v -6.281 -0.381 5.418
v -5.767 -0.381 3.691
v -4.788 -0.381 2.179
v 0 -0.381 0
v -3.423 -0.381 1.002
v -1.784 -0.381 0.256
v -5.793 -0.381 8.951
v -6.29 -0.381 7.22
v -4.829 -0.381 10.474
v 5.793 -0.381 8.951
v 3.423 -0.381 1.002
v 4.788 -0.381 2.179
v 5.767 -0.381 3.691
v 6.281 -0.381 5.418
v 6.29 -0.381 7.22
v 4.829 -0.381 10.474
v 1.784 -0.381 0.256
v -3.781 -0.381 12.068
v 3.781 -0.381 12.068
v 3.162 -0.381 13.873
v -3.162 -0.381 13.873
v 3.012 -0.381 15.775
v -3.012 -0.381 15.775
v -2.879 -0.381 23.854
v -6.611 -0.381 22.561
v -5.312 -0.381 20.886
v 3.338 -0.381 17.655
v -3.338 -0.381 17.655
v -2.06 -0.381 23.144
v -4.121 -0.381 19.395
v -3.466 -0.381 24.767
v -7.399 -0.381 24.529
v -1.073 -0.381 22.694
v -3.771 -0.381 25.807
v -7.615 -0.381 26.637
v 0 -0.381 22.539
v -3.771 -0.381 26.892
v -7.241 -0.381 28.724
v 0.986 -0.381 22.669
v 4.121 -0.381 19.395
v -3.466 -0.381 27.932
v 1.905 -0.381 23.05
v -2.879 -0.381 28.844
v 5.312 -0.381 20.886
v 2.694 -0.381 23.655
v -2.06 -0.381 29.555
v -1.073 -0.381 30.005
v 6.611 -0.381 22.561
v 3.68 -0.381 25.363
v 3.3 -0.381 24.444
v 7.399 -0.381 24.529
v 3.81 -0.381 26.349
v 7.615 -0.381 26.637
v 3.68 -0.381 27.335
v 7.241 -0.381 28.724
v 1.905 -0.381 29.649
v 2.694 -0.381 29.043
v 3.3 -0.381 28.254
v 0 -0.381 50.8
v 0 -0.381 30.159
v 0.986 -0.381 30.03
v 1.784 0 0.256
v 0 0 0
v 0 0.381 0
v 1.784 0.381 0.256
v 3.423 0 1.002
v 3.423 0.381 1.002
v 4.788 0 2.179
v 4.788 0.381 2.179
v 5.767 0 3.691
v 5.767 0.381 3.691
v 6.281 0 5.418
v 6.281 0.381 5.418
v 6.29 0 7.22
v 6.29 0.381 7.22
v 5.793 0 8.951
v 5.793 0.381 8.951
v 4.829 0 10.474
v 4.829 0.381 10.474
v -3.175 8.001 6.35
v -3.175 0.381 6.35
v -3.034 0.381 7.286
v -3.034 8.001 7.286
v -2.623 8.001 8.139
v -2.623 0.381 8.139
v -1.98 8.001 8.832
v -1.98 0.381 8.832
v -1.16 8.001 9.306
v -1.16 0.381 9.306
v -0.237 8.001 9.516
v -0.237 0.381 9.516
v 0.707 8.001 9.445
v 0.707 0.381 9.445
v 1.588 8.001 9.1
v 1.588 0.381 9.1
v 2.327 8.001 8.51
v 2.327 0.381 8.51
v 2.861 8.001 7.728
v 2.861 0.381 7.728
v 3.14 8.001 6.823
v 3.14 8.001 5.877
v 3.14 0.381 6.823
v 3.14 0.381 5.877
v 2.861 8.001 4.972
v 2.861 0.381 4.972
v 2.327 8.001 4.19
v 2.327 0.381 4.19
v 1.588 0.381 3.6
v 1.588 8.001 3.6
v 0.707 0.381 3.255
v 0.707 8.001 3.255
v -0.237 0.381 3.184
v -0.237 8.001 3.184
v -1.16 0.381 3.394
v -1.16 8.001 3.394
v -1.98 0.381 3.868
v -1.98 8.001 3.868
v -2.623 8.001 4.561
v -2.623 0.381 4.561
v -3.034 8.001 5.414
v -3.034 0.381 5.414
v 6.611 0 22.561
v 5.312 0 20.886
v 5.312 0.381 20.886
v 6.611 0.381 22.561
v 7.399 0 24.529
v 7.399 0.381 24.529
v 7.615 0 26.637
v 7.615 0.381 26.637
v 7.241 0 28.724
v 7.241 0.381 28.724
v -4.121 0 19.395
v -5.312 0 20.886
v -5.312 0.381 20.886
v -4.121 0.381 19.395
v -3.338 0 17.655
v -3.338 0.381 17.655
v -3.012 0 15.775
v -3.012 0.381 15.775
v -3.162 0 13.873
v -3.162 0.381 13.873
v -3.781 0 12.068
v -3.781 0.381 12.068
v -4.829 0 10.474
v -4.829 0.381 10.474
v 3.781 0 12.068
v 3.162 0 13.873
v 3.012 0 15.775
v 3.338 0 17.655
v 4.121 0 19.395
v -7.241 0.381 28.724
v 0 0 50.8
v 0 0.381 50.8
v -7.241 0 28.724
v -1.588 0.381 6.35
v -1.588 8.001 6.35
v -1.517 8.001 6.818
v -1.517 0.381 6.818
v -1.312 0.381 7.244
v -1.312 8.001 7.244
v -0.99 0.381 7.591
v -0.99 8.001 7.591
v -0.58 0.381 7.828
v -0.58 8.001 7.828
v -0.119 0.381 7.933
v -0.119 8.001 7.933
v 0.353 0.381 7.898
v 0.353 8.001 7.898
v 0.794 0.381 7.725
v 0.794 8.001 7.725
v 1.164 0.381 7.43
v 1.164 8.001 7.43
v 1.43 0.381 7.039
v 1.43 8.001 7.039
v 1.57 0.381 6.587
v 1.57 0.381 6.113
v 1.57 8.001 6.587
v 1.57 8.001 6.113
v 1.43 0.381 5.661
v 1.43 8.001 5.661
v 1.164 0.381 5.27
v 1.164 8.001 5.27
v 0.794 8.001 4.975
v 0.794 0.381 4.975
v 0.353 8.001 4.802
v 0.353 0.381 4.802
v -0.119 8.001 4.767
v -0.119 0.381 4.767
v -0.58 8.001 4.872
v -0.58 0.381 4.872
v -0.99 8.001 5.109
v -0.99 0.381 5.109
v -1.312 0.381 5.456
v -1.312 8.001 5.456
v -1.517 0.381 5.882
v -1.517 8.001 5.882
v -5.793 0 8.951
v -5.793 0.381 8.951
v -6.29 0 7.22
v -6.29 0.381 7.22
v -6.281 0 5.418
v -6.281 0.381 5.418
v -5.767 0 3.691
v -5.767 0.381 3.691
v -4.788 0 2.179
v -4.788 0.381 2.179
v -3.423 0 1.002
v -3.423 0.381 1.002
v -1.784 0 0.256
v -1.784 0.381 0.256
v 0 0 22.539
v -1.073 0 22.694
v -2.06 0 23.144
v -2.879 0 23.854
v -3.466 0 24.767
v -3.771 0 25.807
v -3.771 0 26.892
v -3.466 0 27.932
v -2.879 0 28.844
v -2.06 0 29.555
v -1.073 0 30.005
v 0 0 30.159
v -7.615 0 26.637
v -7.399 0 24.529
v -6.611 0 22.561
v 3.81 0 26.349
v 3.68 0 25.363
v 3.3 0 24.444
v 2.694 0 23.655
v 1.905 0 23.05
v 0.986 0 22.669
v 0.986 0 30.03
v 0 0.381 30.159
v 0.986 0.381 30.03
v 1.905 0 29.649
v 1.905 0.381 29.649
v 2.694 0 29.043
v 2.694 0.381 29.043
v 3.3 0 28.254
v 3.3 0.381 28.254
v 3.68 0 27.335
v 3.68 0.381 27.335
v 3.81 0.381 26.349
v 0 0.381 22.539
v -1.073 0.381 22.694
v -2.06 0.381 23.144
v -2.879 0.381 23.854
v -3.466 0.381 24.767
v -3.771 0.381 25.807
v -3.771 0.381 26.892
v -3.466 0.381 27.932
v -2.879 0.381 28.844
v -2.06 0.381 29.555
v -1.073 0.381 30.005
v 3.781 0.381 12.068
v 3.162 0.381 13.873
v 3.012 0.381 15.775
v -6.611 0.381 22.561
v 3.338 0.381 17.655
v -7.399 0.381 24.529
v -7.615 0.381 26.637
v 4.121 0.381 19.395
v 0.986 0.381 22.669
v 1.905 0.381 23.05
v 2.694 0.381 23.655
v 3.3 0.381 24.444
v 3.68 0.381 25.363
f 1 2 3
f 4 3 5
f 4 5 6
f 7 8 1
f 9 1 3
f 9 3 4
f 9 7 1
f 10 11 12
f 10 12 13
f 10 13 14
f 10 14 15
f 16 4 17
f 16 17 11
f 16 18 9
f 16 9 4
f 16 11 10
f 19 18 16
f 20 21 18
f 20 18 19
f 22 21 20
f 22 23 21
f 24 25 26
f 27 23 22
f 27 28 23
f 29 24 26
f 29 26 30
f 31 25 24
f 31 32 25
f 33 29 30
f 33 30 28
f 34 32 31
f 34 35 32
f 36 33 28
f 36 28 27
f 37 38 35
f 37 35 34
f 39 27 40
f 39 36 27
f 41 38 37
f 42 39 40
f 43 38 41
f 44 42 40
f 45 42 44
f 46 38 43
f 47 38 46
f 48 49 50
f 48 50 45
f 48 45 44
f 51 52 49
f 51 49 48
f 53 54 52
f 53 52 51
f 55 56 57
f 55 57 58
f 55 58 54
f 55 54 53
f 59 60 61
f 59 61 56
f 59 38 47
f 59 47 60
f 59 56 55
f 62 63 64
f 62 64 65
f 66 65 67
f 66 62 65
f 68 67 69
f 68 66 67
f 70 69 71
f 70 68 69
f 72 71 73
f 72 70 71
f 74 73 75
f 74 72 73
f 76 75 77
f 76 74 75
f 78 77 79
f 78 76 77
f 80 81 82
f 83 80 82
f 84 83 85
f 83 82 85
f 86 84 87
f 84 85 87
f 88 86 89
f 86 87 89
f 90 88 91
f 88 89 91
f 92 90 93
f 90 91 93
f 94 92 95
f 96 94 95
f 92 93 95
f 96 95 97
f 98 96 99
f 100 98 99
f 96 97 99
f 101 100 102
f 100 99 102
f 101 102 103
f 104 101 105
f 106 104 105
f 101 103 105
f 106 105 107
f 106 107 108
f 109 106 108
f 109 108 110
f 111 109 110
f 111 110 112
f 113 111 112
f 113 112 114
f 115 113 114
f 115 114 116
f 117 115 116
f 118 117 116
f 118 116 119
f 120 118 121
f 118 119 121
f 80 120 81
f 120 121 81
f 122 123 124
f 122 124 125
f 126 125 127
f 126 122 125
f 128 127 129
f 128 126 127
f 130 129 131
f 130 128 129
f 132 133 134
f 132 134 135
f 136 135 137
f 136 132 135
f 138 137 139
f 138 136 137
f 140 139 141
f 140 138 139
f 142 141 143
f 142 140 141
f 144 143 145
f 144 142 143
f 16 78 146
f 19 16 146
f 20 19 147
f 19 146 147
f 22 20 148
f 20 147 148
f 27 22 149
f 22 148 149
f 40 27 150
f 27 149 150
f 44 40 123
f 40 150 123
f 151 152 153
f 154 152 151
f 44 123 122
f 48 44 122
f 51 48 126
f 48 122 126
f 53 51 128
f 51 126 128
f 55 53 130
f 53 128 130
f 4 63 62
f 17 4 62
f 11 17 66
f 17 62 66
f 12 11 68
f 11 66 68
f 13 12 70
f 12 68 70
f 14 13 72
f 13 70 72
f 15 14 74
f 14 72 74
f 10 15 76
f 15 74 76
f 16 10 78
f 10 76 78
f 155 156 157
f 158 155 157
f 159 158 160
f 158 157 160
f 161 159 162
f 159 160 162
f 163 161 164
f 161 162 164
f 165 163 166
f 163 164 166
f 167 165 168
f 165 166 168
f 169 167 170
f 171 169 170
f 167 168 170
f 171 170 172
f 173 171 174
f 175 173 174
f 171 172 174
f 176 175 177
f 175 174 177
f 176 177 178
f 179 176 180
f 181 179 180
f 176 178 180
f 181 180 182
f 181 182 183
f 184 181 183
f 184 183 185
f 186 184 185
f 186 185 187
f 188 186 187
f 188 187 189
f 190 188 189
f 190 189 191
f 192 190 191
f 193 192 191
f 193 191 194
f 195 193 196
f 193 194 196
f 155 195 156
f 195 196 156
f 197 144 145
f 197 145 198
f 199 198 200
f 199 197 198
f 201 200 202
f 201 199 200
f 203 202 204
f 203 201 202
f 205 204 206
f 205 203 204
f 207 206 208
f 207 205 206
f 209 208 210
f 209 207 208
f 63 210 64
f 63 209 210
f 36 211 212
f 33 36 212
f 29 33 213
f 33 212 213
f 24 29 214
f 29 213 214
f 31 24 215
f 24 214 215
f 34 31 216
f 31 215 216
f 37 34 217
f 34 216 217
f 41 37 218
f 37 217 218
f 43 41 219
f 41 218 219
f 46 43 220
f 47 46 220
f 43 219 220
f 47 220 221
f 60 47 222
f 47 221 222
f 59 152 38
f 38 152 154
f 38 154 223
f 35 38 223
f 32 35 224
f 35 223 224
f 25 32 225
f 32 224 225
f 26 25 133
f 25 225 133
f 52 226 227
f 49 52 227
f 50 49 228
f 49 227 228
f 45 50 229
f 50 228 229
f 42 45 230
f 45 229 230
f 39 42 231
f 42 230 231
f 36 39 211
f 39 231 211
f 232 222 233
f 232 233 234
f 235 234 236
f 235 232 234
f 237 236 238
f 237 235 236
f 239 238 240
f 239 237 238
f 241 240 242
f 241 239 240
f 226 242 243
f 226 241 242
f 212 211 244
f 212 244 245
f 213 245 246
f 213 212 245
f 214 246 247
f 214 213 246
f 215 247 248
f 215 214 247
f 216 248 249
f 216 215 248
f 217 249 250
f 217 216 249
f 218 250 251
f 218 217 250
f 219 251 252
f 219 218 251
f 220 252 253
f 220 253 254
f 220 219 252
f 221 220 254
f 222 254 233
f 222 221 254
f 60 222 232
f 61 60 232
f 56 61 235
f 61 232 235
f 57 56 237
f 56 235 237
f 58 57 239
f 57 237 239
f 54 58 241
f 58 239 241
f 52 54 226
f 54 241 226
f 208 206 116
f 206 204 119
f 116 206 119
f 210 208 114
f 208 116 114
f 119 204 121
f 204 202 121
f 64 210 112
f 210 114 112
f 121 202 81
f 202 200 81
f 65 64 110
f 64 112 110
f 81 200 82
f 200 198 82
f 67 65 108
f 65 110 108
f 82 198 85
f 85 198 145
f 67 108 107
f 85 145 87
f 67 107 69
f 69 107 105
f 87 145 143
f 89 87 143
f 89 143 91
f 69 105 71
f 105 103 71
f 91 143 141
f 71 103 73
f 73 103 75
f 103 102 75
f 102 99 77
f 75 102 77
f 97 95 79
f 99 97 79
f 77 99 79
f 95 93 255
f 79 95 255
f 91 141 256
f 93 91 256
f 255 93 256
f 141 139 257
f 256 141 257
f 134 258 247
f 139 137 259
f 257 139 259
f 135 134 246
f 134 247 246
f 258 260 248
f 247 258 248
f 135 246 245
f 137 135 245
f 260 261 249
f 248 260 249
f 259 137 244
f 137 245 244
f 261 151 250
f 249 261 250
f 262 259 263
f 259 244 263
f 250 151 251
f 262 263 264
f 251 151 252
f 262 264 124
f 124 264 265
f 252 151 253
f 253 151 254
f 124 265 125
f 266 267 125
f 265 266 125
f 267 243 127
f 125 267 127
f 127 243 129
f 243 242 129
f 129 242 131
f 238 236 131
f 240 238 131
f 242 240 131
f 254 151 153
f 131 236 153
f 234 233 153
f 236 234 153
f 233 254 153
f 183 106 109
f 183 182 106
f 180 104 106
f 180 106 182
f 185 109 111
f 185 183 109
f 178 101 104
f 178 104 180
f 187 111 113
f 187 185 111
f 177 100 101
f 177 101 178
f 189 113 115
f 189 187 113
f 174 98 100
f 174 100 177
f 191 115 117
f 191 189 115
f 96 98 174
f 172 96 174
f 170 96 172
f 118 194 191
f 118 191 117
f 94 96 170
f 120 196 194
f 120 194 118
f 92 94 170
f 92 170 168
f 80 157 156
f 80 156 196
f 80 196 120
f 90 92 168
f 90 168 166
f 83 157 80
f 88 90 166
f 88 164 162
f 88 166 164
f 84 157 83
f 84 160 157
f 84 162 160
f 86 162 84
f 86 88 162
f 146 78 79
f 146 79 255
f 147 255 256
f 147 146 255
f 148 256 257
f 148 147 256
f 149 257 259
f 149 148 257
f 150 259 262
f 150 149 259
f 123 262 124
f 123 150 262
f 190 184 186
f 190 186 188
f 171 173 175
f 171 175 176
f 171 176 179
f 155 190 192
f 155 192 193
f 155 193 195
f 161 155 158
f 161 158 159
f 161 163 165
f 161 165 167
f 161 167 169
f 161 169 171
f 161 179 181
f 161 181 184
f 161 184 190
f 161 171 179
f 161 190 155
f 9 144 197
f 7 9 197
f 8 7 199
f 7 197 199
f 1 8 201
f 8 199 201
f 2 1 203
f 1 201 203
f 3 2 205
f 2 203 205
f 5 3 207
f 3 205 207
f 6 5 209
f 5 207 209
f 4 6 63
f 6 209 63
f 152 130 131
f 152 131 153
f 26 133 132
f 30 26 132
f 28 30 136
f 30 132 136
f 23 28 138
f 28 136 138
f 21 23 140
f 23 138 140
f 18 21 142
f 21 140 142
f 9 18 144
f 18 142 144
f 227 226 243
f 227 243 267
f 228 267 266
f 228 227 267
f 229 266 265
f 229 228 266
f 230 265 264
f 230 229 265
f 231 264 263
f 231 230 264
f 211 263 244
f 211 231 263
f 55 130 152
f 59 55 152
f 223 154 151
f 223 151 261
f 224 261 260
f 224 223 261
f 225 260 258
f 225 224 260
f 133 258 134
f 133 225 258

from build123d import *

# Parameters (mm, degrees)
F1_DEPTH = 0.381
F2_R     = 3.175
F3_DEPTH = 7.62
F4_R     = 1.5875
F5_DEPTH = 7.62


with BuildPart() as f1:
    # F0 (on Front) → F1 (new body, symmetric)
    with BuildSketch(Plane.XZ):
        with BuildLine():
            Line((0, 22.5393476782), (0, 0))
            ThreePointArc((0, 0), (5.7666386867, 3.691357817), (4.8287964934, 10.4737391315))
            ThreePointArc((4.8287964934, 10.4737391315), (3.0115337416, 15.7752394789), (5.3116761428, 20.8857868838))
            ThreePointArc((5.3116761428, 20.8857868838), (7.399265484, 24.5285593059), (7.2405055752, 28.7241064059))
            Line((7.2405055752, 28.7241064059), (0, 50.8))
            Line((0, 50.8), (0, 30.1593476782))
            ThreePointArc((0, 30.1593476782), (2.6940768363, 29.0434245145), (3.81, 26.3493476782))
            ThreePointArc((3.81, 26.3493476782), (2.6940768363, 23.6552708418), (0, 22.5393476782))
        make_face()
        with BuildLine():
            ThreePointArc((-4.8287964934, 10.4737391315), (-5.7666386867, 3.691357817), (0, 0))
            Line((0, 0), (0, 22.5393476782))
            ThreePointArc((0, 22.5393476782), (-3.81, 26.3493476782), (0, 30.1593476782))
            Line((0, 30.1593476782), (0, 50.8))
            Line((0, 50.8), (-7.2405055752, 28.7241064059))
            ThreePointArc((-7.2405055752, 28.7241064059), (-7.399265484, 24.5285593059), (-5.3116761428, 20.8857868838))
            ThreePointArc((-5.3116761428, 20.8857868838), (-3.0115337416, 15.7752394789), (-4.8287964934, 10.4737391315))
        make_face()
    extrude(amount=F1_DEPTH, both=True)

    # F2 (on face) → F3 (join)
    with BuildSketch(Plane(origin=(0, 0.381, 0), x_dir=(-1, 0, 0), z_dir=(0, 1, 0))):
        with Locations((0, 6.35)):
            Circle(F2_R)
    extrude(amount=F3_DEPTH)

    # F4 (on face) → F5 (cut)
    with BuildSketch(Plane(origin=(0, 8.001, 0), x_dir=(-1, 0, 0), z_dir=(0, 1, 0))):
        with Locations((0, 6.35)):
            Circle(F4_R)
    extrude(amount=-F5_DEPTH, mode=Mode.SUBTRACT)


solid = f1.part
